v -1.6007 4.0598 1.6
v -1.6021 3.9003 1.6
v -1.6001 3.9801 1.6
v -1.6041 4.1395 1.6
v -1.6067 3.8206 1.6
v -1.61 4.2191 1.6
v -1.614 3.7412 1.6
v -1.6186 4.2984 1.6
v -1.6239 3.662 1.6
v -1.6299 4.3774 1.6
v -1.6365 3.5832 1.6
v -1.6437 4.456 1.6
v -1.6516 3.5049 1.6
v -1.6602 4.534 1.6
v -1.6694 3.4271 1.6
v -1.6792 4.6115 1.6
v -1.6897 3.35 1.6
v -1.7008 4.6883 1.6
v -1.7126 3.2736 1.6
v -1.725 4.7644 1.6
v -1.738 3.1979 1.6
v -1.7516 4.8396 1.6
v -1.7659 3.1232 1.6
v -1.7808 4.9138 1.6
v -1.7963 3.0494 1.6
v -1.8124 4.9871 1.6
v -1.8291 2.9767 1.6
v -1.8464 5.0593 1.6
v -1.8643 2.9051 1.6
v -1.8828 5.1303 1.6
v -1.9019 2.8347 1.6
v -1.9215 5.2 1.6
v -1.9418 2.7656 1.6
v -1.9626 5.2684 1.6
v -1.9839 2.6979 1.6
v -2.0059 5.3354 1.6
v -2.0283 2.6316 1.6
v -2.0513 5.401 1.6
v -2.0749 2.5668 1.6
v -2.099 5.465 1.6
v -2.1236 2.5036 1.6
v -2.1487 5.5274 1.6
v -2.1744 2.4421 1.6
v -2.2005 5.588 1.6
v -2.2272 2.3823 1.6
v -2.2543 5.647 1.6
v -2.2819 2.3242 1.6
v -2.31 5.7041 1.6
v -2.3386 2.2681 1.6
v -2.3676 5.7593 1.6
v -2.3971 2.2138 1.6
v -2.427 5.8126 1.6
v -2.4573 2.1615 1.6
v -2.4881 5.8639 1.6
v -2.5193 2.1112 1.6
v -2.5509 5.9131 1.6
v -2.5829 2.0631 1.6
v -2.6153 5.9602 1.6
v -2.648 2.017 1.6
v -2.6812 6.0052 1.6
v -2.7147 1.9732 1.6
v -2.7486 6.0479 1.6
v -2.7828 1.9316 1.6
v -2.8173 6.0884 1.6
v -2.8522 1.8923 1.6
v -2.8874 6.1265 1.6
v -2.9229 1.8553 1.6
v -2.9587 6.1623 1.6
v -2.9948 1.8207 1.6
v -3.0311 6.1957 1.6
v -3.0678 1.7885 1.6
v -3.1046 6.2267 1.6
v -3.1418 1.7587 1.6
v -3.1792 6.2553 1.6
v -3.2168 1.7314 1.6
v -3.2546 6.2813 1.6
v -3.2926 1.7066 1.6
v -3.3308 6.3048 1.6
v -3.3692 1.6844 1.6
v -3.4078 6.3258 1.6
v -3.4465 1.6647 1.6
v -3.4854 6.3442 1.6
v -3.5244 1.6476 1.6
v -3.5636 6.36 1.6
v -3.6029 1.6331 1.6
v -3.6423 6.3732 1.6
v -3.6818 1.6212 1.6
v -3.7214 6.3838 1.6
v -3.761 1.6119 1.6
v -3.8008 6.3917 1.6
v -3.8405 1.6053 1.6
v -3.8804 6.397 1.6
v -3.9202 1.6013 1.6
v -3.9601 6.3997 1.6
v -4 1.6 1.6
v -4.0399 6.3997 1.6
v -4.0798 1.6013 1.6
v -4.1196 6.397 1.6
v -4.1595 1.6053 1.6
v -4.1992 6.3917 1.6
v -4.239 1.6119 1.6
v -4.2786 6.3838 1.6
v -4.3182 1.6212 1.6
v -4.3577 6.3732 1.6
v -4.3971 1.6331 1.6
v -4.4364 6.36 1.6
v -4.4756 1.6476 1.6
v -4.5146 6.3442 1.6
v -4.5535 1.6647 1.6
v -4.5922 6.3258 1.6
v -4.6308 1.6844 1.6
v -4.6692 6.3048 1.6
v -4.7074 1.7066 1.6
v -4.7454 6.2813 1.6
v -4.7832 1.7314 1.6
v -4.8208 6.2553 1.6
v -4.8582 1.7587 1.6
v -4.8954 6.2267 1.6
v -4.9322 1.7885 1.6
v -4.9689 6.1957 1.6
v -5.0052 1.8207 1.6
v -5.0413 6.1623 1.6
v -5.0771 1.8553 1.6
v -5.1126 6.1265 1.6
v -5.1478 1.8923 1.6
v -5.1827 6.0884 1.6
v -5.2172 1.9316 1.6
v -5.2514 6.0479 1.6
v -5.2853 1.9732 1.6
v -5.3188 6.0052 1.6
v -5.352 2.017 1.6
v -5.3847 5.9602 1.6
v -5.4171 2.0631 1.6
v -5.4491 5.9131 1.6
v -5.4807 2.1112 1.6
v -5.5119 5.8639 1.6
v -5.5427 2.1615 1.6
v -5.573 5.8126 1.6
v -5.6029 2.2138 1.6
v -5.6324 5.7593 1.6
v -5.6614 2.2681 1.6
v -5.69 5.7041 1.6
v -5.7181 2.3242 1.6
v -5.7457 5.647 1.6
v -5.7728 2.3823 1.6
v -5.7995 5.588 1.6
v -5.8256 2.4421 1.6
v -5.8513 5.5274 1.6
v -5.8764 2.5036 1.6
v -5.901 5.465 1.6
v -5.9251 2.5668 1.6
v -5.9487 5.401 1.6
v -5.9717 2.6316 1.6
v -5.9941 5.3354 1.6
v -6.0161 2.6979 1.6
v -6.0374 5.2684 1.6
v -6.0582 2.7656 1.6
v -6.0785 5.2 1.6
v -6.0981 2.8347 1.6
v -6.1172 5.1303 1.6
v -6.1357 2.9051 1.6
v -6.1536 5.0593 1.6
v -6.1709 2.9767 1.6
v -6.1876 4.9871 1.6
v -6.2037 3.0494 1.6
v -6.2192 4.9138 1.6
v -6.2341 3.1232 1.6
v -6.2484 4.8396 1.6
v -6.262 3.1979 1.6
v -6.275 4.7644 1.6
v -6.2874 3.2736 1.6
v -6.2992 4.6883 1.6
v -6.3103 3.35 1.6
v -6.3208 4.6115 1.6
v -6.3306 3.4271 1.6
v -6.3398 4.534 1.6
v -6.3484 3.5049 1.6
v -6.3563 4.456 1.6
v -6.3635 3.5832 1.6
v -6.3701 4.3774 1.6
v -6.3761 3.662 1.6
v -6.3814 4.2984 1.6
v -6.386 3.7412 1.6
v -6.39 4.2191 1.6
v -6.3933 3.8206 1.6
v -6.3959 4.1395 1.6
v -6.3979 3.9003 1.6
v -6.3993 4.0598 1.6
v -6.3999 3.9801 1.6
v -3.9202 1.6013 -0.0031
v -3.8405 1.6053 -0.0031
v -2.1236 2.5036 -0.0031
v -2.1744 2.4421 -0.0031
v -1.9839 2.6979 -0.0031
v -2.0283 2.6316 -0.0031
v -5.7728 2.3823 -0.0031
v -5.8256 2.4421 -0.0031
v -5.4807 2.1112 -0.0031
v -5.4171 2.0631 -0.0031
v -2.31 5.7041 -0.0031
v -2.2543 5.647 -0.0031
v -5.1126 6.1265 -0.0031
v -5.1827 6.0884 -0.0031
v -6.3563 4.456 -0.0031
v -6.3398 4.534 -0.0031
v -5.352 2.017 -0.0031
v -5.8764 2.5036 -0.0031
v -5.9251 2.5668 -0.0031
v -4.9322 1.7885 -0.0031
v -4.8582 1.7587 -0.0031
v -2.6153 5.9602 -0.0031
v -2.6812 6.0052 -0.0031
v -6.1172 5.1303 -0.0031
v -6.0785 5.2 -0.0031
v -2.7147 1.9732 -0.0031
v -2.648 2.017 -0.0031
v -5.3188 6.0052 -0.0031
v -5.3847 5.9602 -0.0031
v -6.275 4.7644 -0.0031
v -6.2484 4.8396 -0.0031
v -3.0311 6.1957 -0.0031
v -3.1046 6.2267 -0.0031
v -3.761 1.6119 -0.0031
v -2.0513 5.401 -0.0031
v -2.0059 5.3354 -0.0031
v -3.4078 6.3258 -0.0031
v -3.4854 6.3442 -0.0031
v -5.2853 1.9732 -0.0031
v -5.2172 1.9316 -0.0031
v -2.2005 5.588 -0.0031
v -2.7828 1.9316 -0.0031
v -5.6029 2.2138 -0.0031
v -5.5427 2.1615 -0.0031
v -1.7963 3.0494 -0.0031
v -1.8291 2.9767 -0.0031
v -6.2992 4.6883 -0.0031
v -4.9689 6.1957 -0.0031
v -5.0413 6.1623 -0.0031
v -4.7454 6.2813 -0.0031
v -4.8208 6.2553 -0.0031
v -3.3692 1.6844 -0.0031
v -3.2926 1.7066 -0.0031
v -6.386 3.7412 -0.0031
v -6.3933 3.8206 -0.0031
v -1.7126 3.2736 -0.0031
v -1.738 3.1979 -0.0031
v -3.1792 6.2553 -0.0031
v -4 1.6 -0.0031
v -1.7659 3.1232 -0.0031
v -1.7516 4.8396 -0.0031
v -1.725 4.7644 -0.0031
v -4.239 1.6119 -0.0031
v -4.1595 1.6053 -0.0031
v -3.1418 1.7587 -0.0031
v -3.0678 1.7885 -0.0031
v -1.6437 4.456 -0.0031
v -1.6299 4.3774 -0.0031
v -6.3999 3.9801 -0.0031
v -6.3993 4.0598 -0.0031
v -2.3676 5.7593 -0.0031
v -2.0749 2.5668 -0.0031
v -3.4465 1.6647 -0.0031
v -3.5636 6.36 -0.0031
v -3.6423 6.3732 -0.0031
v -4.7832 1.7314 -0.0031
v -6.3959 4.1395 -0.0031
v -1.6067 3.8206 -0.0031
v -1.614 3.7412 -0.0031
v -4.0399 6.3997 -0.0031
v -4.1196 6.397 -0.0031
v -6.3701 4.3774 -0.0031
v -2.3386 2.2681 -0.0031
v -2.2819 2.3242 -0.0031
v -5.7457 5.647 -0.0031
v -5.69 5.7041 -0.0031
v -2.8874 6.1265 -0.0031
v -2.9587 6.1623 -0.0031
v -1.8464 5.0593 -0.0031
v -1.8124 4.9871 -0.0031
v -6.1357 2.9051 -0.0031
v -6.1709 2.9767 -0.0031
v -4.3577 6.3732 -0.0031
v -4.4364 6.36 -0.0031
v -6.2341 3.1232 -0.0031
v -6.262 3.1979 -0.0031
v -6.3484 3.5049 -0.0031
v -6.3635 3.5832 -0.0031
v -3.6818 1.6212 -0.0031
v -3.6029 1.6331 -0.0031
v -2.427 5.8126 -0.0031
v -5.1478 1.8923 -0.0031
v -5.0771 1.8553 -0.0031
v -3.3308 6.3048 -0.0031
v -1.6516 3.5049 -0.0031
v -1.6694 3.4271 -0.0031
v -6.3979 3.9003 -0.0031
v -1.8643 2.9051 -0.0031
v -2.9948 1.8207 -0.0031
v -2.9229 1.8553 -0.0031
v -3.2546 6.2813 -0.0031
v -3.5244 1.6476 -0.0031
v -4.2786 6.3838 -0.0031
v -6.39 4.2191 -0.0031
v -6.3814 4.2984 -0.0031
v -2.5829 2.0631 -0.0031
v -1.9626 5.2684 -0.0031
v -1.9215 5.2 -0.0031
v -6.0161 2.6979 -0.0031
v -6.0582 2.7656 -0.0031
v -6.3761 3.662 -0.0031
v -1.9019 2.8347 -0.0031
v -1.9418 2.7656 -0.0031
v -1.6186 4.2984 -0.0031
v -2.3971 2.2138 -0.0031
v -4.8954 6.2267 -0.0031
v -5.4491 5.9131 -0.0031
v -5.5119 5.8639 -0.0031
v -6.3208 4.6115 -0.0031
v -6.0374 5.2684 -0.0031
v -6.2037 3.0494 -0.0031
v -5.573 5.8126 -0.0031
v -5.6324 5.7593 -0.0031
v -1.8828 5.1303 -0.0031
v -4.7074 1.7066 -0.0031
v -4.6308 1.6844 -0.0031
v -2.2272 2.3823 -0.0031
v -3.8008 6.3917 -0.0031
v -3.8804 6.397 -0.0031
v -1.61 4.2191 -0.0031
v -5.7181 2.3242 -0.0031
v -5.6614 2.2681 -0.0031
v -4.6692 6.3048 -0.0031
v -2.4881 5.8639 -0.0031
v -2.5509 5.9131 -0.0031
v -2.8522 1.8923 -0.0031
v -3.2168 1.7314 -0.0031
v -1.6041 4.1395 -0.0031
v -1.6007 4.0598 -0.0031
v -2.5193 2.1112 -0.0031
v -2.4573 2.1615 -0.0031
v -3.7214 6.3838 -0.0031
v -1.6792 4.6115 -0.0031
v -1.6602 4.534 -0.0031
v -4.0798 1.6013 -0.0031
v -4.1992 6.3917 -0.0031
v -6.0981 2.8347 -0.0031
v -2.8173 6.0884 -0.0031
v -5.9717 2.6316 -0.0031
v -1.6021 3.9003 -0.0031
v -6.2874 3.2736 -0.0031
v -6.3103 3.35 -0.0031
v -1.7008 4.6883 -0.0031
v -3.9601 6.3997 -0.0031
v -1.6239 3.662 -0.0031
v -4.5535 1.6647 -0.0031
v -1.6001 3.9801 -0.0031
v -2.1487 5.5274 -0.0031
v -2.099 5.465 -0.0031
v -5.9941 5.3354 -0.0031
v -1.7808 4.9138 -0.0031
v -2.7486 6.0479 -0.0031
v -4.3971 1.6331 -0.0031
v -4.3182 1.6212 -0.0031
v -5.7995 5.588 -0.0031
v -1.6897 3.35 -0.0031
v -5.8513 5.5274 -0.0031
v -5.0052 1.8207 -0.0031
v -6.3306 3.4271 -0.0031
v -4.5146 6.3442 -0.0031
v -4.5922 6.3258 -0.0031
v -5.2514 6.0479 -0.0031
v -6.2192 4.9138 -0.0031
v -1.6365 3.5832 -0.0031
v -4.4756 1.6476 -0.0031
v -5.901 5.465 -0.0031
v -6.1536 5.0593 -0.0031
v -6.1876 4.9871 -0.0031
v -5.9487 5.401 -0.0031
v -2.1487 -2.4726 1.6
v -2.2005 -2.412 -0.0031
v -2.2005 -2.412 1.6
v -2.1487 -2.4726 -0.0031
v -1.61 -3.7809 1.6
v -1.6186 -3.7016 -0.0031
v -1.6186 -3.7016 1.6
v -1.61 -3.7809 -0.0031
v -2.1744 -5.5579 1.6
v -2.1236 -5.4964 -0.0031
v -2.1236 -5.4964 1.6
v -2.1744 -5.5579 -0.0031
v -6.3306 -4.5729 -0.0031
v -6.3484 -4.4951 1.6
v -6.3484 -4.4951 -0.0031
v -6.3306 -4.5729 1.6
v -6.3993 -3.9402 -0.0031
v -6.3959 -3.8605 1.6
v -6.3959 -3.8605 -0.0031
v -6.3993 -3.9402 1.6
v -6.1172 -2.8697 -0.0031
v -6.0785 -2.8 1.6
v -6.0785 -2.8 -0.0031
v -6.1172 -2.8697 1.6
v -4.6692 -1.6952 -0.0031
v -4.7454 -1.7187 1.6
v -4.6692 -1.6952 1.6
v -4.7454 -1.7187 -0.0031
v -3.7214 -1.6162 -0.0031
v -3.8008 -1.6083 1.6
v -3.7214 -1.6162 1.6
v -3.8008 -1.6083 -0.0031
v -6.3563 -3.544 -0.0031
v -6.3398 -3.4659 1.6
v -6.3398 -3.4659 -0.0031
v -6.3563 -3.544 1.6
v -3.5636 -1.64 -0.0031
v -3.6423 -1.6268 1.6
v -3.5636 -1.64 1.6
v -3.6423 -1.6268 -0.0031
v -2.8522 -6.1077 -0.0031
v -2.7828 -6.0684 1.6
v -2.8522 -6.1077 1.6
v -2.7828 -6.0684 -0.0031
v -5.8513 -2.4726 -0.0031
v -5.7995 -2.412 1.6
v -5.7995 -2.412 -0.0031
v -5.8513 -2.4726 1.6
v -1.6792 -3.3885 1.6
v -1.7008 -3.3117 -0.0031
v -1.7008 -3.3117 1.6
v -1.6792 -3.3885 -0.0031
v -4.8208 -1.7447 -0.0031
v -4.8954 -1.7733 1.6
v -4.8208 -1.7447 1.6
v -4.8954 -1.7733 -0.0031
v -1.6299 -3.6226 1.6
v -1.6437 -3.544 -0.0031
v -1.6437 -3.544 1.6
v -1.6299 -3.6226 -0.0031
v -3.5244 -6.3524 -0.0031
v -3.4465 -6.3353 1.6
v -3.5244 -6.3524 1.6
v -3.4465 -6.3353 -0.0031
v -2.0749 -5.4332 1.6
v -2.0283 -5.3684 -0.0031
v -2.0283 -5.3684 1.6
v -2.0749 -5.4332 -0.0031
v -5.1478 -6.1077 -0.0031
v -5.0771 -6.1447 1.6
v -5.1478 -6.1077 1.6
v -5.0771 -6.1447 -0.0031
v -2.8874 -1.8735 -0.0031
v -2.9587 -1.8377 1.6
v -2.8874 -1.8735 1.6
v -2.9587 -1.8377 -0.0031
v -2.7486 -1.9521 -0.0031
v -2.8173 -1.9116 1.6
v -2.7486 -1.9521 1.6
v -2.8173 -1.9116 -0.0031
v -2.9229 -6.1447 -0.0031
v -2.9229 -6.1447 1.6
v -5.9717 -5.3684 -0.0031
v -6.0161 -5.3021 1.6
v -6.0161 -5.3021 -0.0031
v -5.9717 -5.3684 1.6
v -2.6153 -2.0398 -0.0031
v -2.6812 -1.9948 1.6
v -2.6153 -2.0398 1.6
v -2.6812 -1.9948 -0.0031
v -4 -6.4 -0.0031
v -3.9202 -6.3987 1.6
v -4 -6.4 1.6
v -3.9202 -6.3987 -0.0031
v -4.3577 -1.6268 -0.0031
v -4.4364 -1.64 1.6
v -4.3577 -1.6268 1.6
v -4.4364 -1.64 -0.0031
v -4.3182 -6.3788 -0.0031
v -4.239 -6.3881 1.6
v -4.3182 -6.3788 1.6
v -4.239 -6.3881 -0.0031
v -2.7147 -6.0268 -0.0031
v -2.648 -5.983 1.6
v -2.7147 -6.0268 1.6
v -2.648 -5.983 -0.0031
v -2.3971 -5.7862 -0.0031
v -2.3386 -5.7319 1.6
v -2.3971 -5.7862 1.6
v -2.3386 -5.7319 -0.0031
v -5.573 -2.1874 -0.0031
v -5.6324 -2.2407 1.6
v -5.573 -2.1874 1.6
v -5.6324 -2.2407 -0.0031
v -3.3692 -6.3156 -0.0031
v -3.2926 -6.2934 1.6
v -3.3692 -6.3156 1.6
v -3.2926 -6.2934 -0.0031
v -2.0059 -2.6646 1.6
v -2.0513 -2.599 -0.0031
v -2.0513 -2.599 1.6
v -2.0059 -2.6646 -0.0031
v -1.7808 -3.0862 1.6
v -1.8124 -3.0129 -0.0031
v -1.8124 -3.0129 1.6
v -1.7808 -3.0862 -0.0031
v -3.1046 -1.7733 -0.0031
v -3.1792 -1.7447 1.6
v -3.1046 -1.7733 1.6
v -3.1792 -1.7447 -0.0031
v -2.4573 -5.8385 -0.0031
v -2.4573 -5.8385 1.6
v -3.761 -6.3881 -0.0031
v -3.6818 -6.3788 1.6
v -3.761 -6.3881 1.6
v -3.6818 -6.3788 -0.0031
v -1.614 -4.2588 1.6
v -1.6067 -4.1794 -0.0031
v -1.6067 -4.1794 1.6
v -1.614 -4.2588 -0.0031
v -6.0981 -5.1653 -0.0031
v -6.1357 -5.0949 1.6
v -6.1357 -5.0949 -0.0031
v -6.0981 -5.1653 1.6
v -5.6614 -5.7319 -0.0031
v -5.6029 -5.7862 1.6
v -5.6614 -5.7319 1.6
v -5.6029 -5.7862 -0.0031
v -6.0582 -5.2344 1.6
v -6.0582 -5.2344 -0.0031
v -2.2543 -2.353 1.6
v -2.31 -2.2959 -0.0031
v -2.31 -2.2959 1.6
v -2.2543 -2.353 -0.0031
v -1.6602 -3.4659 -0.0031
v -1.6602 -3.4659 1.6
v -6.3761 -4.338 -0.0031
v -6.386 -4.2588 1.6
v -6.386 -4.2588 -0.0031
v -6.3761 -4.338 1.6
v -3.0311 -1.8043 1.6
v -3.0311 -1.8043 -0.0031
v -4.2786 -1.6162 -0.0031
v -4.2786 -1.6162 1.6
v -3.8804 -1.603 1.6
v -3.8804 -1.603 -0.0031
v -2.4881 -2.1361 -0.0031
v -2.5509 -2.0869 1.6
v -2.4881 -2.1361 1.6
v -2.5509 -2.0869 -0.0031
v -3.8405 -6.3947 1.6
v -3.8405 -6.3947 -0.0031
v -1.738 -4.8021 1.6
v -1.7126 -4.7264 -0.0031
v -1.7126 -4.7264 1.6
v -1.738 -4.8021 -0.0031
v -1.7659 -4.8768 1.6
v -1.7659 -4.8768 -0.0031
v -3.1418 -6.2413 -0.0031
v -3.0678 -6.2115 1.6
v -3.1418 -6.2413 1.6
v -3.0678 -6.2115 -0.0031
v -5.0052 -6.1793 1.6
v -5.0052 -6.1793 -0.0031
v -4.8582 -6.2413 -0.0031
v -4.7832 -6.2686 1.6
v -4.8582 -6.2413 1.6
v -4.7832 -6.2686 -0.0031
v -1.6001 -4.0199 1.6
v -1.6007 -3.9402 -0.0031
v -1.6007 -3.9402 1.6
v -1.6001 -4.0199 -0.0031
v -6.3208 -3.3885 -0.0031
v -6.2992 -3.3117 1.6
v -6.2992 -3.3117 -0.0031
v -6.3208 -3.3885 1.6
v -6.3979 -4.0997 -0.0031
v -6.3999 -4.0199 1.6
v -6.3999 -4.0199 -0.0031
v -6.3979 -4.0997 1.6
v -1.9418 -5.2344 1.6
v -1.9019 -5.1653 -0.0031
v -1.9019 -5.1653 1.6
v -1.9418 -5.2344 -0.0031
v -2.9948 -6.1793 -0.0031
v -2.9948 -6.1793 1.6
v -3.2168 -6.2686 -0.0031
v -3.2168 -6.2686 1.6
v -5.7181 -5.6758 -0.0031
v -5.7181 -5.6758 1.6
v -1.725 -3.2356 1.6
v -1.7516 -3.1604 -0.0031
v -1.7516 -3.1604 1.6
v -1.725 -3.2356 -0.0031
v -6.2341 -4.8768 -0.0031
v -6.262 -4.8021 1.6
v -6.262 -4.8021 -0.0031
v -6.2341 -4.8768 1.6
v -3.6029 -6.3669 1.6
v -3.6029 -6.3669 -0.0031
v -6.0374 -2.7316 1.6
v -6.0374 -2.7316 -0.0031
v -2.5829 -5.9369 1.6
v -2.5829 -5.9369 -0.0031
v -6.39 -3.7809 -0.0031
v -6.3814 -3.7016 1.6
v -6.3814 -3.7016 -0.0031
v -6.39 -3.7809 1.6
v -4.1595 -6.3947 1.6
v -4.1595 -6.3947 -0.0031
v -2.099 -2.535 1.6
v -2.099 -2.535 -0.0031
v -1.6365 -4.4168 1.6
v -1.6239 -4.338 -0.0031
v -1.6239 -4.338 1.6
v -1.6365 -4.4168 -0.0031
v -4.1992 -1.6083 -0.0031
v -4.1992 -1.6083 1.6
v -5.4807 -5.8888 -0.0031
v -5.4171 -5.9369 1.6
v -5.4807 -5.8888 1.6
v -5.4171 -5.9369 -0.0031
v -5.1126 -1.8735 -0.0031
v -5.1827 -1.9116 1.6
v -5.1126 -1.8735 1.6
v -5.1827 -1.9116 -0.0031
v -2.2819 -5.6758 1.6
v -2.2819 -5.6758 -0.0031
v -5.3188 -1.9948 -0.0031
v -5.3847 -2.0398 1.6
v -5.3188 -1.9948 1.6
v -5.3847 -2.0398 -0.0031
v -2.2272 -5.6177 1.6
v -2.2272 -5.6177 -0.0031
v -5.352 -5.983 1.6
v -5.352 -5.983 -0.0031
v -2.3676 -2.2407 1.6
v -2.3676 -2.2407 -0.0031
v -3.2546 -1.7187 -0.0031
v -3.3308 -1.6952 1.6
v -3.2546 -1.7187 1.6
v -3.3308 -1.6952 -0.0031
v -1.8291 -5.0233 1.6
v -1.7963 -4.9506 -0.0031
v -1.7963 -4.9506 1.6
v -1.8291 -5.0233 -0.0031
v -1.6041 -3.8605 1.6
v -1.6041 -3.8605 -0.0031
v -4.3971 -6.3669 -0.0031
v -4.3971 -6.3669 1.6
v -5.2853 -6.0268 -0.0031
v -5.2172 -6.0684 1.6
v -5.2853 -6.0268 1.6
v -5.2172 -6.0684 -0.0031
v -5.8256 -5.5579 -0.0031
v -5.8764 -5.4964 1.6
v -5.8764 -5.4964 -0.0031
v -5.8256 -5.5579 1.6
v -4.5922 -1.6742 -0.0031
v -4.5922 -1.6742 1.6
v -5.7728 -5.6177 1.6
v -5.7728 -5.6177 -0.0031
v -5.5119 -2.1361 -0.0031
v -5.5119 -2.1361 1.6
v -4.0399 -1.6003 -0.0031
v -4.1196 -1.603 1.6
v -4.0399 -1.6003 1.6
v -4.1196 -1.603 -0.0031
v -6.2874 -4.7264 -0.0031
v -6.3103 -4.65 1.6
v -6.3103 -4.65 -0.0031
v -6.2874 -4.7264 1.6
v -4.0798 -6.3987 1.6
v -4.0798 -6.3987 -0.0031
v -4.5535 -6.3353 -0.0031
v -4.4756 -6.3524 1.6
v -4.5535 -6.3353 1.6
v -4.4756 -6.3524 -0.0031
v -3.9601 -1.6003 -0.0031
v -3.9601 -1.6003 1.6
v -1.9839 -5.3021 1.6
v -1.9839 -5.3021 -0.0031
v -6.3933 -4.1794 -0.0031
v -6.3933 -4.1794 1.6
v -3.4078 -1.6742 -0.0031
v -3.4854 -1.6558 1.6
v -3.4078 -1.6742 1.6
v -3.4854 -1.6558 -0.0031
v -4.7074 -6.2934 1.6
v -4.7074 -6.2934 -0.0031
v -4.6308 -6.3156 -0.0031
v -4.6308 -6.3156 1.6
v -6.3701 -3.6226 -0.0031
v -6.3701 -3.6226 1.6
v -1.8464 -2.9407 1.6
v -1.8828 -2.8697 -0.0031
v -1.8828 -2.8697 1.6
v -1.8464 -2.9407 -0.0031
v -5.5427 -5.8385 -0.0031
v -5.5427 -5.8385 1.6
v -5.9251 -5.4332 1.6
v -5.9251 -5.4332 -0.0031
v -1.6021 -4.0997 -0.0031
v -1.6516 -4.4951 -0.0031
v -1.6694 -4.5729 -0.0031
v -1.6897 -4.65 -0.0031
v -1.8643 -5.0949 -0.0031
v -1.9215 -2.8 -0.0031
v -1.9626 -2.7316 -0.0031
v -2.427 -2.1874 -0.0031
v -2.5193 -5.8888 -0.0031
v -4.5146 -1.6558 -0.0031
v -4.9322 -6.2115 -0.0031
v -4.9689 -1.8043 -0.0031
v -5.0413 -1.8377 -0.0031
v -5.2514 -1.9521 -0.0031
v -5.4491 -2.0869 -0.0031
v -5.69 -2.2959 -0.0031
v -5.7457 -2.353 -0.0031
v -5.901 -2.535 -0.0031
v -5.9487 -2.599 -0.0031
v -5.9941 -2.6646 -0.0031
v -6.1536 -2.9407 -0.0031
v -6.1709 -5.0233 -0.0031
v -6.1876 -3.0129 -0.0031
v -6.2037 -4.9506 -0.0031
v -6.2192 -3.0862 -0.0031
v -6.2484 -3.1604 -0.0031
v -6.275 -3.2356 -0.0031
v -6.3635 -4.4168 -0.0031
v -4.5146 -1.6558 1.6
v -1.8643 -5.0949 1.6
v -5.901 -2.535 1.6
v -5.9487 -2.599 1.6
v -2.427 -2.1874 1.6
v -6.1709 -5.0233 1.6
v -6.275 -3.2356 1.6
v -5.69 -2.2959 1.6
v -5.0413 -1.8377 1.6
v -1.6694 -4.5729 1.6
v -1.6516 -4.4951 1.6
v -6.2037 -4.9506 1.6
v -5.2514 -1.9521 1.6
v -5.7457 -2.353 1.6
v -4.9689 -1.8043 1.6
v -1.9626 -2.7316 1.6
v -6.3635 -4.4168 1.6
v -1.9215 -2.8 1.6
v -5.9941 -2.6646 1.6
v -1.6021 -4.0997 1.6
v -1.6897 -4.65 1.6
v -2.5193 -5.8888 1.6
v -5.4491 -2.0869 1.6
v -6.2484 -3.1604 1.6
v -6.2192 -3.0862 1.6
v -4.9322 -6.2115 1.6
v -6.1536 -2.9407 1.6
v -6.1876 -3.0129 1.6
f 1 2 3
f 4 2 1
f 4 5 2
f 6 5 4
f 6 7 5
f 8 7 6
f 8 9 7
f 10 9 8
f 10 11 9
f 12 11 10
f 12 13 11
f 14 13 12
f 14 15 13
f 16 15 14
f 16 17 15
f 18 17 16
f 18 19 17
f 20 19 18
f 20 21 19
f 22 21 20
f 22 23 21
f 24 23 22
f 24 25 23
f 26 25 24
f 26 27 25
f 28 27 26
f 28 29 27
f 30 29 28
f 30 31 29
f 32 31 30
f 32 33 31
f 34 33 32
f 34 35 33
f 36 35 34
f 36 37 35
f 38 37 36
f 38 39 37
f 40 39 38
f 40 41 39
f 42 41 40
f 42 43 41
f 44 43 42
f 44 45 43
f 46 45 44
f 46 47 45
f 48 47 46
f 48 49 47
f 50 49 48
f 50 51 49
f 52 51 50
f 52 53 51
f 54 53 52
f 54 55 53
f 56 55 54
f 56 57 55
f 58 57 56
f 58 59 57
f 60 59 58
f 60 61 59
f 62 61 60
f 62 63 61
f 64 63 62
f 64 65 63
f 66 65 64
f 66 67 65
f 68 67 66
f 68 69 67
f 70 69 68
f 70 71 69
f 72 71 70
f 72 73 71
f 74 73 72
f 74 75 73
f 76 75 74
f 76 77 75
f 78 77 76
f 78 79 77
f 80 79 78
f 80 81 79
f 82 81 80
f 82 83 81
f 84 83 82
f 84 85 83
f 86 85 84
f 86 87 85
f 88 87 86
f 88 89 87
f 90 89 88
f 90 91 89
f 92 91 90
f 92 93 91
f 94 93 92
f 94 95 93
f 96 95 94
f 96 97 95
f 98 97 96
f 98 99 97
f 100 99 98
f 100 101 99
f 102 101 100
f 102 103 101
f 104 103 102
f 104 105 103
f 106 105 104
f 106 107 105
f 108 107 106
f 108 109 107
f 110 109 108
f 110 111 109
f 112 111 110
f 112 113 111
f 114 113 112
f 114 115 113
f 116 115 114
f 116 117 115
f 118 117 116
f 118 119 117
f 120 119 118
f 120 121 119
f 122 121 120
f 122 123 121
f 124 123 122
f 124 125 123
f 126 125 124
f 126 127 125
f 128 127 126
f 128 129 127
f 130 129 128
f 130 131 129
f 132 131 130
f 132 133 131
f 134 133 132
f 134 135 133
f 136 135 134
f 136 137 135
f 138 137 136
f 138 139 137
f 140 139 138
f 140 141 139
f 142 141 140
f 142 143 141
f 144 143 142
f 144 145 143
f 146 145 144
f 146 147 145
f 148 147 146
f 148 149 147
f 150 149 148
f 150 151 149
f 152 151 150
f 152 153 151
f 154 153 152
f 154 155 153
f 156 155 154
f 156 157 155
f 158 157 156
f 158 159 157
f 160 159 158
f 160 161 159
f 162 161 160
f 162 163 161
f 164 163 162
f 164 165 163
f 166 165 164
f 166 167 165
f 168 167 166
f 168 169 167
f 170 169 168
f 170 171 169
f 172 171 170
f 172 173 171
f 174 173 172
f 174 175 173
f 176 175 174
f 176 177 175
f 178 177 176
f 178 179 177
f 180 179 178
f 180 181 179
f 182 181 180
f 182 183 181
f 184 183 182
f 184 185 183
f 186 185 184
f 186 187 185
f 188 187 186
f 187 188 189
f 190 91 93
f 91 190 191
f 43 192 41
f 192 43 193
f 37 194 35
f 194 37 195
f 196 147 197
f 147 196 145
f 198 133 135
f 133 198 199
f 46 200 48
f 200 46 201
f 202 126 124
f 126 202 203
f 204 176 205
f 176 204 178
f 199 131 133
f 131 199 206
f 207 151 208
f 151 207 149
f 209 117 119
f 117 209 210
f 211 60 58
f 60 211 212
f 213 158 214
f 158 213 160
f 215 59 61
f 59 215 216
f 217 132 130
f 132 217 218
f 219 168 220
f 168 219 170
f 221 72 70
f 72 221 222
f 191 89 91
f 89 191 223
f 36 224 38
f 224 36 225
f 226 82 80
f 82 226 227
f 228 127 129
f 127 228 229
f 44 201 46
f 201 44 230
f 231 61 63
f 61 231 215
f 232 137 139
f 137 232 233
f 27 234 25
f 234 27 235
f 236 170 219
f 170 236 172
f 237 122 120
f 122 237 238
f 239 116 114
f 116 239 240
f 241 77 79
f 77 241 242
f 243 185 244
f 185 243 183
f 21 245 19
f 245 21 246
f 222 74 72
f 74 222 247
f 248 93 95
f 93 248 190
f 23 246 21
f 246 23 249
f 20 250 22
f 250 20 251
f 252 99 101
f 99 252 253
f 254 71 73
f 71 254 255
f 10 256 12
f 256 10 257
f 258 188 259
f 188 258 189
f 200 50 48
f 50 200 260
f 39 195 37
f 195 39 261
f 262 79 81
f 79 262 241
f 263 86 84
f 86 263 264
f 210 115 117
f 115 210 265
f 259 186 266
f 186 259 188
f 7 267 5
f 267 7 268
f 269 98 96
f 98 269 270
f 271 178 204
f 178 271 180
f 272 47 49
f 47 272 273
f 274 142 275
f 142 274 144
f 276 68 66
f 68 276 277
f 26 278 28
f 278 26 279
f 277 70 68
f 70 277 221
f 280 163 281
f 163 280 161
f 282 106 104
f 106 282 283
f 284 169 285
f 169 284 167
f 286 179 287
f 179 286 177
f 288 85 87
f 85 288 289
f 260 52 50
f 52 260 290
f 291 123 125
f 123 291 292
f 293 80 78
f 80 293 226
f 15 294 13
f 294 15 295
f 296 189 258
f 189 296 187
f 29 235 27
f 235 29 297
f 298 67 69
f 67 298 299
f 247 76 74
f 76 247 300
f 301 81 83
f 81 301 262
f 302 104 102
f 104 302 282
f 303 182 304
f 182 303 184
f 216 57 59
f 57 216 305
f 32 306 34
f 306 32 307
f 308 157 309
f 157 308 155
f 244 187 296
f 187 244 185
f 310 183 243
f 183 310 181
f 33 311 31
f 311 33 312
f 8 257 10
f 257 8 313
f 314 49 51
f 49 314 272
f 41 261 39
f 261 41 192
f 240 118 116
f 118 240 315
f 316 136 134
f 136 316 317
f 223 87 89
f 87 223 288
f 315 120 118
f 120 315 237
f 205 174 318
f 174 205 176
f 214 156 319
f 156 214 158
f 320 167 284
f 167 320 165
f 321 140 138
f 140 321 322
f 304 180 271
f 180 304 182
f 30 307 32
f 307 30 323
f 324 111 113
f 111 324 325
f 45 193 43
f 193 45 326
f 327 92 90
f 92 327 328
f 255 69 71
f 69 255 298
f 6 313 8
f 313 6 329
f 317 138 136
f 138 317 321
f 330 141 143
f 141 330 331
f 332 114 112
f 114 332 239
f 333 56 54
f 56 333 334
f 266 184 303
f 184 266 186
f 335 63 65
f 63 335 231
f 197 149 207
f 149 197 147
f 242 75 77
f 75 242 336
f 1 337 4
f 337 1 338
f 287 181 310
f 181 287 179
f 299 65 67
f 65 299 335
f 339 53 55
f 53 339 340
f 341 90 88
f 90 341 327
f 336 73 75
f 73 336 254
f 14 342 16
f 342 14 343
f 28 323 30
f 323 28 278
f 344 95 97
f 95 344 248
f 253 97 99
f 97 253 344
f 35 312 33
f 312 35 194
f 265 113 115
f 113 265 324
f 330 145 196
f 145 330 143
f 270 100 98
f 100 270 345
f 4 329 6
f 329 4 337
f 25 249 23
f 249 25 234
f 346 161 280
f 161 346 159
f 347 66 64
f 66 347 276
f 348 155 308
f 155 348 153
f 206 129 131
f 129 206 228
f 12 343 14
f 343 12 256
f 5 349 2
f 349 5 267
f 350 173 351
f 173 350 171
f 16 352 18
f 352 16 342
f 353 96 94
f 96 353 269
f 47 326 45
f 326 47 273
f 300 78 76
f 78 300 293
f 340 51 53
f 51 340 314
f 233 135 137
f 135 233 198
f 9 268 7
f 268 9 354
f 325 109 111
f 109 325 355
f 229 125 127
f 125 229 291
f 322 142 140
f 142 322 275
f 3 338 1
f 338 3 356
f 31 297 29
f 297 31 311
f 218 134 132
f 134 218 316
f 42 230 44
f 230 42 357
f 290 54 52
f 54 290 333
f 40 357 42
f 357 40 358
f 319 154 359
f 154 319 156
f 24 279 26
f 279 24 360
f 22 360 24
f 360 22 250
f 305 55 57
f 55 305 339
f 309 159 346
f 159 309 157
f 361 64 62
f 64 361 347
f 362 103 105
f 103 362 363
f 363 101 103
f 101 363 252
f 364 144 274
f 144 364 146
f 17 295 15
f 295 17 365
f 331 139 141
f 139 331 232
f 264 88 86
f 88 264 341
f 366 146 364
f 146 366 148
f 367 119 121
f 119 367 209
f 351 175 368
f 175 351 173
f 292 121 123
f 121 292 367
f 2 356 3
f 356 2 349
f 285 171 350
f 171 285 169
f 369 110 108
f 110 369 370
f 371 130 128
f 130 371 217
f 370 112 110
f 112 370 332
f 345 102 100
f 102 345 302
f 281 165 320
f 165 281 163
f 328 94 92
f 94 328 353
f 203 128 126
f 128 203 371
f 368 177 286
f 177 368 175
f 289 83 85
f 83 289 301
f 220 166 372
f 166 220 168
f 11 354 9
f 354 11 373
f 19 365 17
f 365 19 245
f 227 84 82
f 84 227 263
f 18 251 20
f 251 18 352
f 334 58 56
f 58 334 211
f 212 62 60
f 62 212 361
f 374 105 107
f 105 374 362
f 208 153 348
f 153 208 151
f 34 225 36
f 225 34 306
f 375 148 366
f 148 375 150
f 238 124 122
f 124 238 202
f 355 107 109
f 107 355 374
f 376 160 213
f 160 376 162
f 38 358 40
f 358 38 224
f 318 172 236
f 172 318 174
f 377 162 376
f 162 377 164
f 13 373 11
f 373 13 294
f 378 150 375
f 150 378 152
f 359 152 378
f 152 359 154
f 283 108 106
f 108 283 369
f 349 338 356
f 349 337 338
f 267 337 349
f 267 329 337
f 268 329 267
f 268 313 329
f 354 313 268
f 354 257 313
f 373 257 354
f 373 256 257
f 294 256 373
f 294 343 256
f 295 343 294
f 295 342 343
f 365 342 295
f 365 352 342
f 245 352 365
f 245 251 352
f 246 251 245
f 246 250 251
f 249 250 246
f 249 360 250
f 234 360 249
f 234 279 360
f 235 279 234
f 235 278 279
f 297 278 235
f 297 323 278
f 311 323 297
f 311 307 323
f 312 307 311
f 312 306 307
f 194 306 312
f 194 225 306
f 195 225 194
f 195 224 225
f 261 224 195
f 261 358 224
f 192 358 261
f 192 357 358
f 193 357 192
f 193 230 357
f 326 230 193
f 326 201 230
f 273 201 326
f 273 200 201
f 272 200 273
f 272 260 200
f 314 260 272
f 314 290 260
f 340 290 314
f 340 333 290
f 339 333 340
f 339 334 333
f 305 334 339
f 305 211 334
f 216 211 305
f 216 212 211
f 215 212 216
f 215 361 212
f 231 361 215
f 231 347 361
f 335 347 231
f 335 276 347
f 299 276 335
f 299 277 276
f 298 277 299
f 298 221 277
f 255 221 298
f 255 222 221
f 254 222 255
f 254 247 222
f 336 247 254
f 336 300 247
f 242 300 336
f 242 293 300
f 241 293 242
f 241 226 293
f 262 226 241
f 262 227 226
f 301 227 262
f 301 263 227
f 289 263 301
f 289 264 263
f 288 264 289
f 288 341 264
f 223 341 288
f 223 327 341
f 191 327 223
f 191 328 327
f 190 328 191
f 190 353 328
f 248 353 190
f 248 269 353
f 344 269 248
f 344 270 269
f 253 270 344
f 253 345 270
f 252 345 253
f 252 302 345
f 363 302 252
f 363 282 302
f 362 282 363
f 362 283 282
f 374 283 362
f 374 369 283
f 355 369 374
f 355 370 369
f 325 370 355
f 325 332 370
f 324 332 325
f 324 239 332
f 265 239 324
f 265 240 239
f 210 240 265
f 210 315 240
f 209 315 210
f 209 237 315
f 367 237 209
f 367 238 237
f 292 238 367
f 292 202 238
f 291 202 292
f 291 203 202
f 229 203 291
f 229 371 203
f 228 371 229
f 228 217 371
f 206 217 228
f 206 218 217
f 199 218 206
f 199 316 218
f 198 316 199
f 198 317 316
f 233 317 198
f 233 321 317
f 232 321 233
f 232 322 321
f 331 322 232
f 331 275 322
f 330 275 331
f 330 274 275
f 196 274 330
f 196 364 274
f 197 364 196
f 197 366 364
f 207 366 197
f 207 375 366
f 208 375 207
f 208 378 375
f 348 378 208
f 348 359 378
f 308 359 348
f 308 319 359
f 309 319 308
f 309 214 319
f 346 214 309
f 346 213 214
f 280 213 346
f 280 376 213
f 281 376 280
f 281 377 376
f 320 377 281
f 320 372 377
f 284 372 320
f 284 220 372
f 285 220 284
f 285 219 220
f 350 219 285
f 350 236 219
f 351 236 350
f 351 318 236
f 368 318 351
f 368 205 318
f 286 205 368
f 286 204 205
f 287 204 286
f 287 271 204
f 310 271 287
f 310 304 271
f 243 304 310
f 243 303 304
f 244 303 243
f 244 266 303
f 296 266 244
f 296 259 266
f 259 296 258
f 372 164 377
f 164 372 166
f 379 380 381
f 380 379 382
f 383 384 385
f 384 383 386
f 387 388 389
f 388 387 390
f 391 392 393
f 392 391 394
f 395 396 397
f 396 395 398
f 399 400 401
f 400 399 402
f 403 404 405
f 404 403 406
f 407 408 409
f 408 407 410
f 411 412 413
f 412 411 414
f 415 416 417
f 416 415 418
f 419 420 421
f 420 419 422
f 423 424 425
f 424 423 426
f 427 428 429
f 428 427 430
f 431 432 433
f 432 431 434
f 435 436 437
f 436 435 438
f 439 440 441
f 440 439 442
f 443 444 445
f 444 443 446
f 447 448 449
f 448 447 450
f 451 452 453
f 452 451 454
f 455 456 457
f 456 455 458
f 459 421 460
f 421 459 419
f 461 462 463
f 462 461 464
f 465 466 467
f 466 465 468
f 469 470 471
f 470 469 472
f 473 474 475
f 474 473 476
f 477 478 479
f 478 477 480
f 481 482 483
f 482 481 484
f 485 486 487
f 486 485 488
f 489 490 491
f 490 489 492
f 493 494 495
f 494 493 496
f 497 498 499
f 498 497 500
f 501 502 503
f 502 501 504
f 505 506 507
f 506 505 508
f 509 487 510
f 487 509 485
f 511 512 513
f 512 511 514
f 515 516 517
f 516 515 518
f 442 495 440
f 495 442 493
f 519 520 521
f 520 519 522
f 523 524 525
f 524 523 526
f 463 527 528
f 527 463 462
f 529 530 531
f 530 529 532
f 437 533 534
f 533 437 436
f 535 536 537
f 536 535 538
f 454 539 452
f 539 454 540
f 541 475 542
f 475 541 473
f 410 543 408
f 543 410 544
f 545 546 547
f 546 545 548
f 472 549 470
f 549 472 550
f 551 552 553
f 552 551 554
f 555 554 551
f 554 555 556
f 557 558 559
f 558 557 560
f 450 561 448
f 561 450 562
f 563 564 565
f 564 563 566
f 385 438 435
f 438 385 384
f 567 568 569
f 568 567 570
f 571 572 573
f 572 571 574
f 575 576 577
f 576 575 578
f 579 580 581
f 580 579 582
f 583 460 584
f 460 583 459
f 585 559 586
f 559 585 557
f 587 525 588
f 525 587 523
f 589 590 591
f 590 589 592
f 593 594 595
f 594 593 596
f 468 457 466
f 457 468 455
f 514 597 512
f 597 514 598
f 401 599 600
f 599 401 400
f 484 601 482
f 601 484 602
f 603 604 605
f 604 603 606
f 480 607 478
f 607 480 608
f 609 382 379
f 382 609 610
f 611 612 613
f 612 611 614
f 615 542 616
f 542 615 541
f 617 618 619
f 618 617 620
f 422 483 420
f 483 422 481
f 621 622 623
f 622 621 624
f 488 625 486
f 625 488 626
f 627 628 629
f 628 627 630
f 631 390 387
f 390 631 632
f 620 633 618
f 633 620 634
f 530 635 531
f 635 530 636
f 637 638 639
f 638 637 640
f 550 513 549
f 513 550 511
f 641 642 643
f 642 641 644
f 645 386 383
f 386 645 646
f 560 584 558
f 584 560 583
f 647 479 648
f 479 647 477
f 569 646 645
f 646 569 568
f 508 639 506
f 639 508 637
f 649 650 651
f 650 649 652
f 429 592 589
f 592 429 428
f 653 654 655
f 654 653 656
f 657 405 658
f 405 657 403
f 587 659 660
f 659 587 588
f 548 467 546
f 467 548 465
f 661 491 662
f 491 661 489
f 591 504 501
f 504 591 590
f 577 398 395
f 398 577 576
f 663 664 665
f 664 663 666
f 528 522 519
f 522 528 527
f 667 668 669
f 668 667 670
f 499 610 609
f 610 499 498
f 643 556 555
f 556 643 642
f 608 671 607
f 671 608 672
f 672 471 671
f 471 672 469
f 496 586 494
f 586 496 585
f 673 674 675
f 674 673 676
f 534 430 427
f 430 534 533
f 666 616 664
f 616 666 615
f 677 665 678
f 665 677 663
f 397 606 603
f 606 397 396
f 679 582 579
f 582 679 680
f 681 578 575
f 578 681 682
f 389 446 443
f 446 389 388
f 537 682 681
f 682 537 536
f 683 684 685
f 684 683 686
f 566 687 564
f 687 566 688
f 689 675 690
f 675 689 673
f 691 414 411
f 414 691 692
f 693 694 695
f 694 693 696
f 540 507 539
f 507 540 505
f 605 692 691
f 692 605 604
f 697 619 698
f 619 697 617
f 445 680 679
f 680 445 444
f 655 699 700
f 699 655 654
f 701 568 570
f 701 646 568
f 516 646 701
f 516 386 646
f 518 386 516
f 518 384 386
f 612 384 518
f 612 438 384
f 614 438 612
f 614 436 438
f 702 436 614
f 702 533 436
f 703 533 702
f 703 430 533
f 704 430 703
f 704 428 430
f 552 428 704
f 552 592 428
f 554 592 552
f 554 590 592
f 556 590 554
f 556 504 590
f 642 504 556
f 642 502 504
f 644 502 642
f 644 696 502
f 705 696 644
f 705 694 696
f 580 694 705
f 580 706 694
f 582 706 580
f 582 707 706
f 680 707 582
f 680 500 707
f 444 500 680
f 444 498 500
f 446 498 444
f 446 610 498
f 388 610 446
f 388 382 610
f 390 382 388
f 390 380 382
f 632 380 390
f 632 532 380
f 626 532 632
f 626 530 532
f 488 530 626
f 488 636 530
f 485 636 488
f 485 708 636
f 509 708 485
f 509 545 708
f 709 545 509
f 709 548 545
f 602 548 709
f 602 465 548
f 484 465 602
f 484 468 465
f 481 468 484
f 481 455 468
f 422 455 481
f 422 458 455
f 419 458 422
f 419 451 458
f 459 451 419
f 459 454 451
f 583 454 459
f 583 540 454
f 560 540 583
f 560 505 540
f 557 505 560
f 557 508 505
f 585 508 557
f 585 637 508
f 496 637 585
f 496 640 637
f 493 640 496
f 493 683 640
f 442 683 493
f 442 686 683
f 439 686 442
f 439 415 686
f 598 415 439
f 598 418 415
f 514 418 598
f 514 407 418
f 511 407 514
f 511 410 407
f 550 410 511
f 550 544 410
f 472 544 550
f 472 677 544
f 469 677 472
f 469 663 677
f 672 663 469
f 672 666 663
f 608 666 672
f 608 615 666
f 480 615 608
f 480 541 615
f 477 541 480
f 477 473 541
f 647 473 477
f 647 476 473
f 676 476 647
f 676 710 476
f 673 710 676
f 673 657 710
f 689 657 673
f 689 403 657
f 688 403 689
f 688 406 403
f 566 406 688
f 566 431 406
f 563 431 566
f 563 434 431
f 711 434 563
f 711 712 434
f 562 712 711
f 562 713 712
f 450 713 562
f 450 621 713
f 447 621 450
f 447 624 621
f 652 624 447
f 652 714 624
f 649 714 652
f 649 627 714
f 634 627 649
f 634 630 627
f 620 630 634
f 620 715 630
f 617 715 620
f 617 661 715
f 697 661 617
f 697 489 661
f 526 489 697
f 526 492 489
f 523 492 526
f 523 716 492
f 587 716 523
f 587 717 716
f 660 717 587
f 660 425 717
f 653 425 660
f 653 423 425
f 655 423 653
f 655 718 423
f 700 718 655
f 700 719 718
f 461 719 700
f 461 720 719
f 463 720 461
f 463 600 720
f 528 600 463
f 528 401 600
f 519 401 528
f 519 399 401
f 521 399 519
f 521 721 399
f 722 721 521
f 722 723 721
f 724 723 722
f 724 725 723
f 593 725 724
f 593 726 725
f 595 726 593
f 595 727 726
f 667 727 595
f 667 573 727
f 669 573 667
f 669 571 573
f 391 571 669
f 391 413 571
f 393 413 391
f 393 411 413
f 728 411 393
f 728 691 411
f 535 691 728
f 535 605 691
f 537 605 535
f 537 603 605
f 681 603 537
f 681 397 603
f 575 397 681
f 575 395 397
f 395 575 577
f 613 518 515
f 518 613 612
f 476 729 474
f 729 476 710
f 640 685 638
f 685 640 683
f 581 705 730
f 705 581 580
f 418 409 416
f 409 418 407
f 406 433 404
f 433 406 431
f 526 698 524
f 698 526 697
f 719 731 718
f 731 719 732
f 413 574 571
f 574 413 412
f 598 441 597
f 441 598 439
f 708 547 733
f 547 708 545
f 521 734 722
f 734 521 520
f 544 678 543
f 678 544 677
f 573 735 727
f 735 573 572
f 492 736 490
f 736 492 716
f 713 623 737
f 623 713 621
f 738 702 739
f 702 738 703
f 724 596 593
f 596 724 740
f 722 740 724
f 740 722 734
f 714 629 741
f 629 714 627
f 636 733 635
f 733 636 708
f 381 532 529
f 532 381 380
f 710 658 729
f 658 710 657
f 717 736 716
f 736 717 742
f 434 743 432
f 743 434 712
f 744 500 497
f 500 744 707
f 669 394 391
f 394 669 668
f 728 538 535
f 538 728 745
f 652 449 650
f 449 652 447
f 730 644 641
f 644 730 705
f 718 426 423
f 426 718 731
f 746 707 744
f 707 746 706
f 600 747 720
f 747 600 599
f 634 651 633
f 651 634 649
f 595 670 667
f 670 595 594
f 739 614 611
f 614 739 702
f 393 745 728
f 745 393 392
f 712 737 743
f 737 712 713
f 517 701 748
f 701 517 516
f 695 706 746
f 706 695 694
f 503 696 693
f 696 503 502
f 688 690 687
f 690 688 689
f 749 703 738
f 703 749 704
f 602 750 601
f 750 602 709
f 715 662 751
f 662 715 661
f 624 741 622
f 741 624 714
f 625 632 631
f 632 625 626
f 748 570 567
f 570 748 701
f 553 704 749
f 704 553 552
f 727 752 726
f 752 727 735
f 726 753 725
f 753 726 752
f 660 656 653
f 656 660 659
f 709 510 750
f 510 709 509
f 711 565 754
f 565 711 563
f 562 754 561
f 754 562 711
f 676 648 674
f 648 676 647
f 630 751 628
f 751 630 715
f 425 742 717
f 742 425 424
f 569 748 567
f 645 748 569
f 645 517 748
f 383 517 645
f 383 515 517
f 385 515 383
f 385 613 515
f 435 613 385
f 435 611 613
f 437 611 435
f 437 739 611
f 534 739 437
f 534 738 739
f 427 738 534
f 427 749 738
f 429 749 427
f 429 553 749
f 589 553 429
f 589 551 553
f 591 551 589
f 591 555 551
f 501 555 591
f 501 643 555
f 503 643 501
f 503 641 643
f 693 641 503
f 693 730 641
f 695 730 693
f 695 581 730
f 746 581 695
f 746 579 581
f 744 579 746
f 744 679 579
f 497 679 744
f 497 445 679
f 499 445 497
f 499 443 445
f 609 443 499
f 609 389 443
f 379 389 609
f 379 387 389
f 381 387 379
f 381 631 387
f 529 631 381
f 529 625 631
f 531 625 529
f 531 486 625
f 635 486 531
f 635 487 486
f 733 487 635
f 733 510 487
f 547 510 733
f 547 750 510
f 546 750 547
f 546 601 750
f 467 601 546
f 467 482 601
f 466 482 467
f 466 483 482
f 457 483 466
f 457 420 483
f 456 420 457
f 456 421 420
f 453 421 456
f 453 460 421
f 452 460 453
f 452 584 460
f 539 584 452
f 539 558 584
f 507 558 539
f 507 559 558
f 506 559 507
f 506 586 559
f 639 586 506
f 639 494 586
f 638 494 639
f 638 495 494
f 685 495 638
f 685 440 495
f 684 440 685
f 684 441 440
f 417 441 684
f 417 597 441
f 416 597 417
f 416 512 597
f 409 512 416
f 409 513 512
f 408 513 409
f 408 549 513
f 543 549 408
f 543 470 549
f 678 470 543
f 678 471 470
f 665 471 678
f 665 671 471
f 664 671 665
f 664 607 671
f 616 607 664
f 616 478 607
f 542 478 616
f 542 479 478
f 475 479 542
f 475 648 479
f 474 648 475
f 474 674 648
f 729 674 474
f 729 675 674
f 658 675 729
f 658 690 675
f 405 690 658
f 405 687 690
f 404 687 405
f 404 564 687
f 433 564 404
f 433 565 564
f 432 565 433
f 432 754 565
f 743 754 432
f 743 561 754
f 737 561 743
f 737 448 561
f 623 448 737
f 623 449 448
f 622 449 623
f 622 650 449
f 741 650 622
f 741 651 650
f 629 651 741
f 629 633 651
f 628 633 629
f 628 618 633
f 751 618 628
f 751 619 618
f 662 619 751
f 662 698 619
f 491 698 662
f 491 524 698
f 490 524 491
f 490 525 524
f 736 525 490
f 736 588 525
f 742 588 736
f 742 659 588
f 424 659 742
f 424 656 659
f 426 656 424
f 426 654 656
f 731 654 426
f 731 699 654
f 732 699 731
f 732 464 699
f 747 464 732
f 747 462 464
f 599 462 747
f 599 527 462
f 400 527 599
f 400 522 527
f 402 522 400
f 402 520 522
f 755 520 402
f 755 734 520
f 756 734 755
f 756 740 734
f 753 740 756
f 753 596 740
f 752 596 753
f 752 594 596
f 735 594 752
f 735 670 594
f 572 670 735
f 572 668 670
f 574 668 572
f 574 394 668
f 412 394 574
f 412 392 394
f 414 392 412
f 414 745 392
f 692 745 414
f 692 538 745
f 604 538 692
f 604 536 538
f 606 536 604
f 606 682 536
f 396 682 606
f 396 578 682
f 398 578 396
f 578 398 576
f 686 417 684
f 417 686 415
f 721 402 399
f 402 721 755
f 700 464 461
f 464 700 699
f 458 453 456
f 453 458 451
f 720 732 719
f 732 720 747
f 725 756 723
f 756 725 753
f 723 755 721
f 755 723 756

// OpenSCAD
use <../../lib.scad>
use <../../p/1-4chrd.scad>
use <../../p/1-4cylo.scad>
use <../../p/box2-7.scad>
use <../../p/box3u4a.scad>
use <../../p/box4-1.scad>
use <../../p/rect.scad>
use <../../p/stud.scad>
$fa=1; $fs=0.2;
function ldraw_lib__s__58124s01(realsolid=false) = [
// 0 ~Electric Power Functions Connector Top
// 0 Name: s\58124s01.dat
// 0 Author: Philippe Hurbain [Philo]
// 0 !LDRAW_ORG Subpart UPDATE 2013-02
// 0 !LICENSE Licensed under CC BY 2.0 and CC BY 4.0 : see CAreadme.txt
// 
// 0 BFC CERTIFY CW
  [0,"BFC","CERTIFY"],
  [0,"BFC","CW"],
// 
// 0 !HISTORY 2007-07-02 [Philo] Modified top for reuse in PF remote receiver
// 0 !HISTORY 2010-07-05 [PTadmin] Official Update 2010-02
// 0 !HISTORY 2013-03-29 [MagFors] Changed colour 383 to 494 (real metal)
// 0 !HISTORY 2013-04-04 [MMR1988] Used cylo prims
// 0 !HISTORY 2013-12-23 [PTadmin] Official Update 2013-02
// 
// 
// 4 16 -20 0 -20 -20 0 20 16 0 10 16 0 -10
  [4,16,-20,0,-20,-20,0,20,16,0,10,16,0,-10],
// 4 16 -20 0 -20 16 0 -10 20 0 -10 20 0 -20
  [4,16,-20,0,-20,16,0,-10,20,0,-10,20,0,-20],
// 4 16 16 0 10 -20 0 20 20 0 20 20 0 10
  [4,16,16,0,10,-20,0,20,20,0,20,20,0,10],
// 1 16 -10 0 10 1 0 0 0 1 0 0 0 1 stud.dat
  [1,16,-10,0,10,1,0,0,0,1,0,0,0,1, ldraw_lib__stud(realsolid)],
// 1 16 -10 0 -10 1 0 0 0 1 0 0 0 1 stud.dat
  [1,16,-10,0,-10,1,0,0,0,1,0,0,0,1, ldraw_lib__stud(realsolid)],
// 1 16 1 -2 0 0 -1 0 2 0 0 0 0 10 box3u4a.dat
  [1,16,1,-2,0,0,-1,0,2,0,0,0,0,10, ldraw_lib__box3u4a(realsolid)],
// 1 16 1 -2 12 0 1 0 2 0 0 0 0 -2 rect.dat
  [1,16,1,-2,12,0,1,0,2,0,0,0,0,-2, ldraw_lib__rect(realsolid)],
// 1 16 1 -2 -12 0 1 0 2 0 0 0 0 -2 rect.dat
  [1,16,1,-2,-12,0,1,0,2,0,0,0,0,-2, ldraw_lib__rect(realsolid)],
// 1 16 8.5 -4 9.17 7.5 0 -7.5 0 4 0 4.83 0 4.83 1-4cylo.dat
  [1,16,8.5,-4,9.17,7.5,0,-7.5,0,4,0,4.83,0,4.83, ldraw_lib__1_4cylo(realsolid)],
// 1 16 8.5 -4 9.17 7.5 0 -7.5 0 1 0 4.83 0 4.83 1-4chrd.dat
  [1,16,8.5,-4,9.17,7.5,0,-7.5,0,1,0,4.83,0,4.83, ldraw_lib__1_4chrd(realsolid)],
// 1 16 8.5 -4 -9.17 -7.5 0 7.5 0 4 0 -4.83 0 -4.83 1-4cylo.dat
  [1,16,8.5,-4,-9.17,-7.5,0,7.5,0,4,0,-4.83,0,-4.83, ldraw_lib__1_4cylo(realsolid)],
// 1 16 8.5 -4 -9.17 -7.5 0 7.5 0 1 0 -4.83 0 -4.83 1-4chrd.dat
  [1,16,8.5,-4,-9.17,-7.5,0,7.5,0,1,0,-4.83,0,-4.83, ldraw_lib__1_4chrd(realsolid)],
// 0 BFC INVERTNEXT
  [0,"BFC","INVERTNEXT"],
// 1 16 18 -2 -12 0 -2 0 2 0 0 0 0 2 box2-7.dat
  [1,16,18,-2,-12,0,-2,0,2,0,0,0,0,2, ldraw_lib__box2_7(realsolid)],
// 2 24 16 -4 14 16 0 14
  [2,24,16,-4,14,16,0,14],
// 2 24 16 -4 -14 16 0 -14
  [2,24,16,-4,-14,16,0,-14],
// 0 BFC INVERTNEXT
  [0,"BFC","INVERTNEXT"],
// 1 16 18 -2 12 0 0 -2 2 0 0 0 -2 0 box2-7.dat
  [1,16,18,-2,12,0,0,-2,2,0,0,0,-2,0, ldraw_lib__box2_7(realsolid)],
// 1 494 3 -2 -2 0 1.5 0 0 0 -2 -2 0 0 box4-1.dat
  [1,494,3,-2,-2,0,1.5,0,0,0,-2,-2,0,0, ldraw_lib__box4_1(realsolid)],
// 1 494 3 -2 6 0 1.5 0 0 0 -2 -2 0 0 box4-1.dat
  [1,494,3,-2,6,0,1.5,0,0,0,-2,-2,0,0, ldraw_lib__box4_1(realsolid)],
// 1 494 14 -2 2 0 -1.5 0 0 0 -2 2 0 0 box4-1.dat
  [1,494,14,-2,2,0,-1.5,0,0,0,-2,2,0,0, ldraw_lib__box4_1(realsolid)],
// 1 494 14 -2 -6 0 -1.5 0 0 0 -2 2 0 0 box4-1.dat
  [1,494,14,-2,-6,0,-1.5,0,0,0,-2,2,0,0, ldraw_lib__box4_1(realsolid)],
// 1 16 13 -2 -2 0 1 0 0 0 2 2 0 0 rect.dat
  [1,16,13,-2,-2,0,1,0,0,0,2,2,0,0, ldraw_lib__rect(realsolid)],
// 1 16 13 -2 -10 0 1 0 0 0 2 2 0 0 rect.dat
  [1,16,13,-2,-10,0,1,0,0,0,2,2,0,0, ldraw_lib__rect(realsolid)],
// 1 16 4 -2 2 0 -1 0 0 0 2 -2 0 0 rect.dat
  [1,16,4,-2,2,0,-1,0,0,0,2,-2,0,0, ldraw_lib__rect(realsolid)],
// 1 16 4 -2 10 0 -1 0 0 0 2 -2 0 0 rect.dat
  [1,16,4,-2,10,0,-1,0,0,0,2,-2,0,0, ldraw_lib__rect(realsolid)],
// 0 BFC INVERTNEXT
  [0,"BFC","INVERTNEXT"],
// 1 16 8.5 -2 8 0 0 4.5 2 0 0 0 4 0 box2-7.dat
  [1,16,8.5,-2,8,0,0,4.5,2,0,0,0,4,0, ldraw_lib__box2_7(realsolid)],
// 0 BFC INVERTNEXT
  [0,"BFC","INVERTNEXT"],
// 1 16 8.5 -2 -8 0 0 -4.5 2 0 0 0 -4 0 box2-7.dat
  [1,16,8.5,-2,-8,0,0,-4.5,2,0,0,0,-4,0, ldraw_lib__box2_7(realsolid)],
// 2 24 13 -4 4 13 0 4
  [2,24,13,-4,4,13,0,4],
// 2 24 4 -4 -4 4 0 -4
  [2,24,4,-4,-4,4,0,-4],
// 4 16 4 -4 12 1 -4 14 16 -4 14 13 -4 12
  [4,16,4,-4,12,1,-4,14,16,-4,14,13,-4,12],
// 4 16 13 -4 -12 16 -4 -14 1 -4 -14 4 -4 -12
  [4,16,13,-4,-12,16,-4,-14,1,-4,-14,4,-4,-12],
// 4 16 4 -4 8 1 -4 10 1 -4 14 4 -4 12
  [4,16,4,-4,8,1,-4,10,1,-4,14,4,-4,12],
// 4 16 16 -4 -14 13 -4 -12 13 -4 -8 16 -4 -10
  [4,16,16,-4,-14,13,-4,-12,13,-4,-8,16,-4,-10],
// 4 16 1 -4 -10 4 -4 -4 4 -4 -12 1 -4 -14
  [4,16,1,-4,-10,4,-4,-4,4,-4,-12,1,-4,-14],
// 4 16 0 -4 10 3 -4 0 3 -4 -4 0 -4 -10
  [4,16,0,-4,10,3,-4,0,3,-4,-4,0,-4,-10],
// 4 16 0 -4 10 1 -4 10 4 -4 8 3 -4 8
  [4,16,0,-4,10,1,-4,10,4,-4,8,3,-4,8],
// 4 16 13 -4 0 14 -4 0 14 -4 -4 13 -4 -4
  [4,16,13,-4,0,14,-4,0,14,-4,-4,13,-4,-4],
// 4 16 3 -4 4 4 -4 4 4 -4 0 3 -4 0
  [4,16,3,-4,4,4,-4,4,4,-4,0,3,-4,0],
// 4 16 3 -4 -4 4 -4 -4 1 -4 -10 0 -4 -10
  [4,16,3,-4,-4,4,-4,-4,1,-4,-10,0,-4,-10],
// 4 16 16 -4 -10 14 -4 0 14 -4 4 16 -4 10
  [4,16,16,-4,-10,14,-4,0,14,-4,4,16,-4,10],
// 4 16 16 -4 10 13 -4 4 13 -4 12 16 -4 14
  [4,16,16,-4,10,13,-4,4,13,-4,12,16,-4,14],
// 3 16 16 -4 -10 14 -4 -8 14 -4 -4
  [3,16,16,-4,-10,14,-4,-8,14,-4,-4],
// 3 16 16 -4 -10 14 -4 -4 14 -4 0
  [3,16,16,-4,-10,14,-4,-4,14,-4,0],
// 3 16 16 -4 10 14 -4 4 13 -4 4
  [3,16,16,-4,10,14,-4,4,13,-4,4],
// 3 16 16 -4 -10 13 -4 -8 14 -4 -8
  [3,16,16,-4,-10,13,-4,-8,14,-4,-8],
// 3 16 3 -4 8 3 -4 4 0 -4 10
  [3,16,3,-4,8,3,-4,4,0,-4,10],
// 3 16 3 -4 4 3 -4 0 0 -4 10
  [3,16,3,-4,4,3,-4,0,0,-4,10],
];
module ldraw_lib__s__58124s01(step=0, col=false, unit=2/5, alt=false, line=0.2, solid=!$preview)
    makepoly(ldraw_lib__s__58124s01(solid), step=step, col=col, unit=unit, alt=alt, line=line, solid=solid);
ldraw_lib__s__58124s01(line=0.2);
